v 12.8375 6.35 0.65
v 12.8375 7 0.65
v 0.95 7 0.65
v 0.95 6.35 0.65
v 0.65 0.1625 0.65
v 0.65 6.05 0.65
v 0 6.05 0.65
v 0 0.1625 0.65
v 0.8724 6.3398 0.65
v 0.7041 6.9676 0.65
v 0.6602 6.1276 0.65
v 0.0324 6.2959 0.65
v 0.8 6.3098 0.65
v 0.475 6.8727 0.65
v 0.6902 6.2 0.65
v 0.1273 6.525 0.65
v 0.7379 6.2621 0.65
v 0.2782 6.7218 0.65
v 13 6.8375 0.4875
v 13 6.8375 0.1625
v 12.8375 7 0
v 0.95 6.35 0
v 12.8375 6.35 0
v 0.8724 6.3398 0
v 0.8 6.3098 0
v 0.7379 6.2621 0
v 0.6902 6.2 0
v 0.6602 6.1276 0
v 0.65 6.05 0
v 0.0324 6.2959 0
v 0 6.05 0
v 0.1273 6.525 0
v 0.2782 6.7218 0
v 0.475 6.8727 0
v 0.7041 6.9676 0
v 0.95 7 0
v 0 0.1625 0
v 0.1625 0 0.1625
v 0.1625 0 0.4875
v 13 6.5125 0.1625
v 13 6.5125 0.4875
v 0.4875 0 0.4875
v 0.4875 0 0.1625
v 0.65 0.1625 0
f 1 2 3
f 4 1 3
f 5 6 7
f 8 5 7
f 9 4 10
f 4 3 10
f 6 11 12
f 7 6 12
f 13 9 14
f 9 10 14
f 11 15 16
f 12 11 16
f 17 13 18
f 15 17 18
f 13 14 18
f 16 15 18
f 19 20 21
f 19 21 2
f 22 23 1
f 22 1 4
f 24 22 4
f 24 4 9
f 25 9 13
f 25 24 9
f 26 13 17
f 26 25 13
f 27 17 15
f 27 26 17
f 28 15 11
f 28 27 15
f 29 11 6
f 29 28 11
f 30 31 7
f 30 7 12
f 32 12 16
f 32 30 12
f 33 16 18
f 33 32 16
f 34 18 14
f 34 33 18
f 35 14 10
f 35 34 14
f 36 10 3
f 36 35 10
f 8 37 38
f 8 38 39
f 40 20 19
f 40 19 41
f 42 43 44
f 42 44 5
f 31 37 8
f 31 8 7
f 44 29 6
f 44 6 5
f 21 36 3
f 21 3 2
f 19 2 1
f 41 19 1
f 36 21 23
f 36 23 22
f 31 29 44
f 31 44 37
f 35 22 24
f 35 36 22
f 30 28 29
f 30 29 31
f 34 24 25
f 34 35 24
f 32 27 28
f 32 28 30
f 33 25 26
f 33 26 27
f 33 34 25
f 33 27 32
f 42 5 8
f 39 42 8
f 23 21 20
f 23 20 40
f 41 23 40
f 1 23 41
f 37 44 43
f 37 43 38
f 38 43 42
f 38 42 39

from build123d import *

# Parameters (mm, degrees)
BODY_DEPTH     = 0.65
CHAMFER_2_SIZE = 0.1625


with BuildPart() as part:
    # Sketch1 → Body (new body)
    with BuildSketch(Plane.XY):
        with BuildLine():
            Line((0.95, 7), (13, 7))
            Line((13, 7), (13, 6.35))
            Line((13, 6.35), (0.95, 6.35))
            ThreePointArc((0.95, 6.35), (0.737867966, 6.262132034), (0.65, 6.05))
            Line((0.65, 6.05), (0.65, 0))
            Line((0.65, 0), (0, 0))
            Line((0, 0), (0, 6.05))
            ThreePointArc((0, 6.05), (0.278248558, 6.721751442), (0.95, 7))
        make_face()
    extrude(amount=BODY_DEPTH)

    # Chamfer 2
    chamfer_2_edges = [part.edges().sort_by_distance(p)[0] for p in [
        (13, 7, 0.325),
        (13, 6.35, 0.325),
        (13, 6.675, 0),
        (13, 6.675, 0.65),
        (0.65, 0, 0.325),
        (0, 0, 0.325),
        (0.325, 0, 0),
        (0.325, 0, 0.65),
    ]]
    chamfer(chamfer_2_edges, length=CHAMFER_2_SIZE)


solid = part.part
